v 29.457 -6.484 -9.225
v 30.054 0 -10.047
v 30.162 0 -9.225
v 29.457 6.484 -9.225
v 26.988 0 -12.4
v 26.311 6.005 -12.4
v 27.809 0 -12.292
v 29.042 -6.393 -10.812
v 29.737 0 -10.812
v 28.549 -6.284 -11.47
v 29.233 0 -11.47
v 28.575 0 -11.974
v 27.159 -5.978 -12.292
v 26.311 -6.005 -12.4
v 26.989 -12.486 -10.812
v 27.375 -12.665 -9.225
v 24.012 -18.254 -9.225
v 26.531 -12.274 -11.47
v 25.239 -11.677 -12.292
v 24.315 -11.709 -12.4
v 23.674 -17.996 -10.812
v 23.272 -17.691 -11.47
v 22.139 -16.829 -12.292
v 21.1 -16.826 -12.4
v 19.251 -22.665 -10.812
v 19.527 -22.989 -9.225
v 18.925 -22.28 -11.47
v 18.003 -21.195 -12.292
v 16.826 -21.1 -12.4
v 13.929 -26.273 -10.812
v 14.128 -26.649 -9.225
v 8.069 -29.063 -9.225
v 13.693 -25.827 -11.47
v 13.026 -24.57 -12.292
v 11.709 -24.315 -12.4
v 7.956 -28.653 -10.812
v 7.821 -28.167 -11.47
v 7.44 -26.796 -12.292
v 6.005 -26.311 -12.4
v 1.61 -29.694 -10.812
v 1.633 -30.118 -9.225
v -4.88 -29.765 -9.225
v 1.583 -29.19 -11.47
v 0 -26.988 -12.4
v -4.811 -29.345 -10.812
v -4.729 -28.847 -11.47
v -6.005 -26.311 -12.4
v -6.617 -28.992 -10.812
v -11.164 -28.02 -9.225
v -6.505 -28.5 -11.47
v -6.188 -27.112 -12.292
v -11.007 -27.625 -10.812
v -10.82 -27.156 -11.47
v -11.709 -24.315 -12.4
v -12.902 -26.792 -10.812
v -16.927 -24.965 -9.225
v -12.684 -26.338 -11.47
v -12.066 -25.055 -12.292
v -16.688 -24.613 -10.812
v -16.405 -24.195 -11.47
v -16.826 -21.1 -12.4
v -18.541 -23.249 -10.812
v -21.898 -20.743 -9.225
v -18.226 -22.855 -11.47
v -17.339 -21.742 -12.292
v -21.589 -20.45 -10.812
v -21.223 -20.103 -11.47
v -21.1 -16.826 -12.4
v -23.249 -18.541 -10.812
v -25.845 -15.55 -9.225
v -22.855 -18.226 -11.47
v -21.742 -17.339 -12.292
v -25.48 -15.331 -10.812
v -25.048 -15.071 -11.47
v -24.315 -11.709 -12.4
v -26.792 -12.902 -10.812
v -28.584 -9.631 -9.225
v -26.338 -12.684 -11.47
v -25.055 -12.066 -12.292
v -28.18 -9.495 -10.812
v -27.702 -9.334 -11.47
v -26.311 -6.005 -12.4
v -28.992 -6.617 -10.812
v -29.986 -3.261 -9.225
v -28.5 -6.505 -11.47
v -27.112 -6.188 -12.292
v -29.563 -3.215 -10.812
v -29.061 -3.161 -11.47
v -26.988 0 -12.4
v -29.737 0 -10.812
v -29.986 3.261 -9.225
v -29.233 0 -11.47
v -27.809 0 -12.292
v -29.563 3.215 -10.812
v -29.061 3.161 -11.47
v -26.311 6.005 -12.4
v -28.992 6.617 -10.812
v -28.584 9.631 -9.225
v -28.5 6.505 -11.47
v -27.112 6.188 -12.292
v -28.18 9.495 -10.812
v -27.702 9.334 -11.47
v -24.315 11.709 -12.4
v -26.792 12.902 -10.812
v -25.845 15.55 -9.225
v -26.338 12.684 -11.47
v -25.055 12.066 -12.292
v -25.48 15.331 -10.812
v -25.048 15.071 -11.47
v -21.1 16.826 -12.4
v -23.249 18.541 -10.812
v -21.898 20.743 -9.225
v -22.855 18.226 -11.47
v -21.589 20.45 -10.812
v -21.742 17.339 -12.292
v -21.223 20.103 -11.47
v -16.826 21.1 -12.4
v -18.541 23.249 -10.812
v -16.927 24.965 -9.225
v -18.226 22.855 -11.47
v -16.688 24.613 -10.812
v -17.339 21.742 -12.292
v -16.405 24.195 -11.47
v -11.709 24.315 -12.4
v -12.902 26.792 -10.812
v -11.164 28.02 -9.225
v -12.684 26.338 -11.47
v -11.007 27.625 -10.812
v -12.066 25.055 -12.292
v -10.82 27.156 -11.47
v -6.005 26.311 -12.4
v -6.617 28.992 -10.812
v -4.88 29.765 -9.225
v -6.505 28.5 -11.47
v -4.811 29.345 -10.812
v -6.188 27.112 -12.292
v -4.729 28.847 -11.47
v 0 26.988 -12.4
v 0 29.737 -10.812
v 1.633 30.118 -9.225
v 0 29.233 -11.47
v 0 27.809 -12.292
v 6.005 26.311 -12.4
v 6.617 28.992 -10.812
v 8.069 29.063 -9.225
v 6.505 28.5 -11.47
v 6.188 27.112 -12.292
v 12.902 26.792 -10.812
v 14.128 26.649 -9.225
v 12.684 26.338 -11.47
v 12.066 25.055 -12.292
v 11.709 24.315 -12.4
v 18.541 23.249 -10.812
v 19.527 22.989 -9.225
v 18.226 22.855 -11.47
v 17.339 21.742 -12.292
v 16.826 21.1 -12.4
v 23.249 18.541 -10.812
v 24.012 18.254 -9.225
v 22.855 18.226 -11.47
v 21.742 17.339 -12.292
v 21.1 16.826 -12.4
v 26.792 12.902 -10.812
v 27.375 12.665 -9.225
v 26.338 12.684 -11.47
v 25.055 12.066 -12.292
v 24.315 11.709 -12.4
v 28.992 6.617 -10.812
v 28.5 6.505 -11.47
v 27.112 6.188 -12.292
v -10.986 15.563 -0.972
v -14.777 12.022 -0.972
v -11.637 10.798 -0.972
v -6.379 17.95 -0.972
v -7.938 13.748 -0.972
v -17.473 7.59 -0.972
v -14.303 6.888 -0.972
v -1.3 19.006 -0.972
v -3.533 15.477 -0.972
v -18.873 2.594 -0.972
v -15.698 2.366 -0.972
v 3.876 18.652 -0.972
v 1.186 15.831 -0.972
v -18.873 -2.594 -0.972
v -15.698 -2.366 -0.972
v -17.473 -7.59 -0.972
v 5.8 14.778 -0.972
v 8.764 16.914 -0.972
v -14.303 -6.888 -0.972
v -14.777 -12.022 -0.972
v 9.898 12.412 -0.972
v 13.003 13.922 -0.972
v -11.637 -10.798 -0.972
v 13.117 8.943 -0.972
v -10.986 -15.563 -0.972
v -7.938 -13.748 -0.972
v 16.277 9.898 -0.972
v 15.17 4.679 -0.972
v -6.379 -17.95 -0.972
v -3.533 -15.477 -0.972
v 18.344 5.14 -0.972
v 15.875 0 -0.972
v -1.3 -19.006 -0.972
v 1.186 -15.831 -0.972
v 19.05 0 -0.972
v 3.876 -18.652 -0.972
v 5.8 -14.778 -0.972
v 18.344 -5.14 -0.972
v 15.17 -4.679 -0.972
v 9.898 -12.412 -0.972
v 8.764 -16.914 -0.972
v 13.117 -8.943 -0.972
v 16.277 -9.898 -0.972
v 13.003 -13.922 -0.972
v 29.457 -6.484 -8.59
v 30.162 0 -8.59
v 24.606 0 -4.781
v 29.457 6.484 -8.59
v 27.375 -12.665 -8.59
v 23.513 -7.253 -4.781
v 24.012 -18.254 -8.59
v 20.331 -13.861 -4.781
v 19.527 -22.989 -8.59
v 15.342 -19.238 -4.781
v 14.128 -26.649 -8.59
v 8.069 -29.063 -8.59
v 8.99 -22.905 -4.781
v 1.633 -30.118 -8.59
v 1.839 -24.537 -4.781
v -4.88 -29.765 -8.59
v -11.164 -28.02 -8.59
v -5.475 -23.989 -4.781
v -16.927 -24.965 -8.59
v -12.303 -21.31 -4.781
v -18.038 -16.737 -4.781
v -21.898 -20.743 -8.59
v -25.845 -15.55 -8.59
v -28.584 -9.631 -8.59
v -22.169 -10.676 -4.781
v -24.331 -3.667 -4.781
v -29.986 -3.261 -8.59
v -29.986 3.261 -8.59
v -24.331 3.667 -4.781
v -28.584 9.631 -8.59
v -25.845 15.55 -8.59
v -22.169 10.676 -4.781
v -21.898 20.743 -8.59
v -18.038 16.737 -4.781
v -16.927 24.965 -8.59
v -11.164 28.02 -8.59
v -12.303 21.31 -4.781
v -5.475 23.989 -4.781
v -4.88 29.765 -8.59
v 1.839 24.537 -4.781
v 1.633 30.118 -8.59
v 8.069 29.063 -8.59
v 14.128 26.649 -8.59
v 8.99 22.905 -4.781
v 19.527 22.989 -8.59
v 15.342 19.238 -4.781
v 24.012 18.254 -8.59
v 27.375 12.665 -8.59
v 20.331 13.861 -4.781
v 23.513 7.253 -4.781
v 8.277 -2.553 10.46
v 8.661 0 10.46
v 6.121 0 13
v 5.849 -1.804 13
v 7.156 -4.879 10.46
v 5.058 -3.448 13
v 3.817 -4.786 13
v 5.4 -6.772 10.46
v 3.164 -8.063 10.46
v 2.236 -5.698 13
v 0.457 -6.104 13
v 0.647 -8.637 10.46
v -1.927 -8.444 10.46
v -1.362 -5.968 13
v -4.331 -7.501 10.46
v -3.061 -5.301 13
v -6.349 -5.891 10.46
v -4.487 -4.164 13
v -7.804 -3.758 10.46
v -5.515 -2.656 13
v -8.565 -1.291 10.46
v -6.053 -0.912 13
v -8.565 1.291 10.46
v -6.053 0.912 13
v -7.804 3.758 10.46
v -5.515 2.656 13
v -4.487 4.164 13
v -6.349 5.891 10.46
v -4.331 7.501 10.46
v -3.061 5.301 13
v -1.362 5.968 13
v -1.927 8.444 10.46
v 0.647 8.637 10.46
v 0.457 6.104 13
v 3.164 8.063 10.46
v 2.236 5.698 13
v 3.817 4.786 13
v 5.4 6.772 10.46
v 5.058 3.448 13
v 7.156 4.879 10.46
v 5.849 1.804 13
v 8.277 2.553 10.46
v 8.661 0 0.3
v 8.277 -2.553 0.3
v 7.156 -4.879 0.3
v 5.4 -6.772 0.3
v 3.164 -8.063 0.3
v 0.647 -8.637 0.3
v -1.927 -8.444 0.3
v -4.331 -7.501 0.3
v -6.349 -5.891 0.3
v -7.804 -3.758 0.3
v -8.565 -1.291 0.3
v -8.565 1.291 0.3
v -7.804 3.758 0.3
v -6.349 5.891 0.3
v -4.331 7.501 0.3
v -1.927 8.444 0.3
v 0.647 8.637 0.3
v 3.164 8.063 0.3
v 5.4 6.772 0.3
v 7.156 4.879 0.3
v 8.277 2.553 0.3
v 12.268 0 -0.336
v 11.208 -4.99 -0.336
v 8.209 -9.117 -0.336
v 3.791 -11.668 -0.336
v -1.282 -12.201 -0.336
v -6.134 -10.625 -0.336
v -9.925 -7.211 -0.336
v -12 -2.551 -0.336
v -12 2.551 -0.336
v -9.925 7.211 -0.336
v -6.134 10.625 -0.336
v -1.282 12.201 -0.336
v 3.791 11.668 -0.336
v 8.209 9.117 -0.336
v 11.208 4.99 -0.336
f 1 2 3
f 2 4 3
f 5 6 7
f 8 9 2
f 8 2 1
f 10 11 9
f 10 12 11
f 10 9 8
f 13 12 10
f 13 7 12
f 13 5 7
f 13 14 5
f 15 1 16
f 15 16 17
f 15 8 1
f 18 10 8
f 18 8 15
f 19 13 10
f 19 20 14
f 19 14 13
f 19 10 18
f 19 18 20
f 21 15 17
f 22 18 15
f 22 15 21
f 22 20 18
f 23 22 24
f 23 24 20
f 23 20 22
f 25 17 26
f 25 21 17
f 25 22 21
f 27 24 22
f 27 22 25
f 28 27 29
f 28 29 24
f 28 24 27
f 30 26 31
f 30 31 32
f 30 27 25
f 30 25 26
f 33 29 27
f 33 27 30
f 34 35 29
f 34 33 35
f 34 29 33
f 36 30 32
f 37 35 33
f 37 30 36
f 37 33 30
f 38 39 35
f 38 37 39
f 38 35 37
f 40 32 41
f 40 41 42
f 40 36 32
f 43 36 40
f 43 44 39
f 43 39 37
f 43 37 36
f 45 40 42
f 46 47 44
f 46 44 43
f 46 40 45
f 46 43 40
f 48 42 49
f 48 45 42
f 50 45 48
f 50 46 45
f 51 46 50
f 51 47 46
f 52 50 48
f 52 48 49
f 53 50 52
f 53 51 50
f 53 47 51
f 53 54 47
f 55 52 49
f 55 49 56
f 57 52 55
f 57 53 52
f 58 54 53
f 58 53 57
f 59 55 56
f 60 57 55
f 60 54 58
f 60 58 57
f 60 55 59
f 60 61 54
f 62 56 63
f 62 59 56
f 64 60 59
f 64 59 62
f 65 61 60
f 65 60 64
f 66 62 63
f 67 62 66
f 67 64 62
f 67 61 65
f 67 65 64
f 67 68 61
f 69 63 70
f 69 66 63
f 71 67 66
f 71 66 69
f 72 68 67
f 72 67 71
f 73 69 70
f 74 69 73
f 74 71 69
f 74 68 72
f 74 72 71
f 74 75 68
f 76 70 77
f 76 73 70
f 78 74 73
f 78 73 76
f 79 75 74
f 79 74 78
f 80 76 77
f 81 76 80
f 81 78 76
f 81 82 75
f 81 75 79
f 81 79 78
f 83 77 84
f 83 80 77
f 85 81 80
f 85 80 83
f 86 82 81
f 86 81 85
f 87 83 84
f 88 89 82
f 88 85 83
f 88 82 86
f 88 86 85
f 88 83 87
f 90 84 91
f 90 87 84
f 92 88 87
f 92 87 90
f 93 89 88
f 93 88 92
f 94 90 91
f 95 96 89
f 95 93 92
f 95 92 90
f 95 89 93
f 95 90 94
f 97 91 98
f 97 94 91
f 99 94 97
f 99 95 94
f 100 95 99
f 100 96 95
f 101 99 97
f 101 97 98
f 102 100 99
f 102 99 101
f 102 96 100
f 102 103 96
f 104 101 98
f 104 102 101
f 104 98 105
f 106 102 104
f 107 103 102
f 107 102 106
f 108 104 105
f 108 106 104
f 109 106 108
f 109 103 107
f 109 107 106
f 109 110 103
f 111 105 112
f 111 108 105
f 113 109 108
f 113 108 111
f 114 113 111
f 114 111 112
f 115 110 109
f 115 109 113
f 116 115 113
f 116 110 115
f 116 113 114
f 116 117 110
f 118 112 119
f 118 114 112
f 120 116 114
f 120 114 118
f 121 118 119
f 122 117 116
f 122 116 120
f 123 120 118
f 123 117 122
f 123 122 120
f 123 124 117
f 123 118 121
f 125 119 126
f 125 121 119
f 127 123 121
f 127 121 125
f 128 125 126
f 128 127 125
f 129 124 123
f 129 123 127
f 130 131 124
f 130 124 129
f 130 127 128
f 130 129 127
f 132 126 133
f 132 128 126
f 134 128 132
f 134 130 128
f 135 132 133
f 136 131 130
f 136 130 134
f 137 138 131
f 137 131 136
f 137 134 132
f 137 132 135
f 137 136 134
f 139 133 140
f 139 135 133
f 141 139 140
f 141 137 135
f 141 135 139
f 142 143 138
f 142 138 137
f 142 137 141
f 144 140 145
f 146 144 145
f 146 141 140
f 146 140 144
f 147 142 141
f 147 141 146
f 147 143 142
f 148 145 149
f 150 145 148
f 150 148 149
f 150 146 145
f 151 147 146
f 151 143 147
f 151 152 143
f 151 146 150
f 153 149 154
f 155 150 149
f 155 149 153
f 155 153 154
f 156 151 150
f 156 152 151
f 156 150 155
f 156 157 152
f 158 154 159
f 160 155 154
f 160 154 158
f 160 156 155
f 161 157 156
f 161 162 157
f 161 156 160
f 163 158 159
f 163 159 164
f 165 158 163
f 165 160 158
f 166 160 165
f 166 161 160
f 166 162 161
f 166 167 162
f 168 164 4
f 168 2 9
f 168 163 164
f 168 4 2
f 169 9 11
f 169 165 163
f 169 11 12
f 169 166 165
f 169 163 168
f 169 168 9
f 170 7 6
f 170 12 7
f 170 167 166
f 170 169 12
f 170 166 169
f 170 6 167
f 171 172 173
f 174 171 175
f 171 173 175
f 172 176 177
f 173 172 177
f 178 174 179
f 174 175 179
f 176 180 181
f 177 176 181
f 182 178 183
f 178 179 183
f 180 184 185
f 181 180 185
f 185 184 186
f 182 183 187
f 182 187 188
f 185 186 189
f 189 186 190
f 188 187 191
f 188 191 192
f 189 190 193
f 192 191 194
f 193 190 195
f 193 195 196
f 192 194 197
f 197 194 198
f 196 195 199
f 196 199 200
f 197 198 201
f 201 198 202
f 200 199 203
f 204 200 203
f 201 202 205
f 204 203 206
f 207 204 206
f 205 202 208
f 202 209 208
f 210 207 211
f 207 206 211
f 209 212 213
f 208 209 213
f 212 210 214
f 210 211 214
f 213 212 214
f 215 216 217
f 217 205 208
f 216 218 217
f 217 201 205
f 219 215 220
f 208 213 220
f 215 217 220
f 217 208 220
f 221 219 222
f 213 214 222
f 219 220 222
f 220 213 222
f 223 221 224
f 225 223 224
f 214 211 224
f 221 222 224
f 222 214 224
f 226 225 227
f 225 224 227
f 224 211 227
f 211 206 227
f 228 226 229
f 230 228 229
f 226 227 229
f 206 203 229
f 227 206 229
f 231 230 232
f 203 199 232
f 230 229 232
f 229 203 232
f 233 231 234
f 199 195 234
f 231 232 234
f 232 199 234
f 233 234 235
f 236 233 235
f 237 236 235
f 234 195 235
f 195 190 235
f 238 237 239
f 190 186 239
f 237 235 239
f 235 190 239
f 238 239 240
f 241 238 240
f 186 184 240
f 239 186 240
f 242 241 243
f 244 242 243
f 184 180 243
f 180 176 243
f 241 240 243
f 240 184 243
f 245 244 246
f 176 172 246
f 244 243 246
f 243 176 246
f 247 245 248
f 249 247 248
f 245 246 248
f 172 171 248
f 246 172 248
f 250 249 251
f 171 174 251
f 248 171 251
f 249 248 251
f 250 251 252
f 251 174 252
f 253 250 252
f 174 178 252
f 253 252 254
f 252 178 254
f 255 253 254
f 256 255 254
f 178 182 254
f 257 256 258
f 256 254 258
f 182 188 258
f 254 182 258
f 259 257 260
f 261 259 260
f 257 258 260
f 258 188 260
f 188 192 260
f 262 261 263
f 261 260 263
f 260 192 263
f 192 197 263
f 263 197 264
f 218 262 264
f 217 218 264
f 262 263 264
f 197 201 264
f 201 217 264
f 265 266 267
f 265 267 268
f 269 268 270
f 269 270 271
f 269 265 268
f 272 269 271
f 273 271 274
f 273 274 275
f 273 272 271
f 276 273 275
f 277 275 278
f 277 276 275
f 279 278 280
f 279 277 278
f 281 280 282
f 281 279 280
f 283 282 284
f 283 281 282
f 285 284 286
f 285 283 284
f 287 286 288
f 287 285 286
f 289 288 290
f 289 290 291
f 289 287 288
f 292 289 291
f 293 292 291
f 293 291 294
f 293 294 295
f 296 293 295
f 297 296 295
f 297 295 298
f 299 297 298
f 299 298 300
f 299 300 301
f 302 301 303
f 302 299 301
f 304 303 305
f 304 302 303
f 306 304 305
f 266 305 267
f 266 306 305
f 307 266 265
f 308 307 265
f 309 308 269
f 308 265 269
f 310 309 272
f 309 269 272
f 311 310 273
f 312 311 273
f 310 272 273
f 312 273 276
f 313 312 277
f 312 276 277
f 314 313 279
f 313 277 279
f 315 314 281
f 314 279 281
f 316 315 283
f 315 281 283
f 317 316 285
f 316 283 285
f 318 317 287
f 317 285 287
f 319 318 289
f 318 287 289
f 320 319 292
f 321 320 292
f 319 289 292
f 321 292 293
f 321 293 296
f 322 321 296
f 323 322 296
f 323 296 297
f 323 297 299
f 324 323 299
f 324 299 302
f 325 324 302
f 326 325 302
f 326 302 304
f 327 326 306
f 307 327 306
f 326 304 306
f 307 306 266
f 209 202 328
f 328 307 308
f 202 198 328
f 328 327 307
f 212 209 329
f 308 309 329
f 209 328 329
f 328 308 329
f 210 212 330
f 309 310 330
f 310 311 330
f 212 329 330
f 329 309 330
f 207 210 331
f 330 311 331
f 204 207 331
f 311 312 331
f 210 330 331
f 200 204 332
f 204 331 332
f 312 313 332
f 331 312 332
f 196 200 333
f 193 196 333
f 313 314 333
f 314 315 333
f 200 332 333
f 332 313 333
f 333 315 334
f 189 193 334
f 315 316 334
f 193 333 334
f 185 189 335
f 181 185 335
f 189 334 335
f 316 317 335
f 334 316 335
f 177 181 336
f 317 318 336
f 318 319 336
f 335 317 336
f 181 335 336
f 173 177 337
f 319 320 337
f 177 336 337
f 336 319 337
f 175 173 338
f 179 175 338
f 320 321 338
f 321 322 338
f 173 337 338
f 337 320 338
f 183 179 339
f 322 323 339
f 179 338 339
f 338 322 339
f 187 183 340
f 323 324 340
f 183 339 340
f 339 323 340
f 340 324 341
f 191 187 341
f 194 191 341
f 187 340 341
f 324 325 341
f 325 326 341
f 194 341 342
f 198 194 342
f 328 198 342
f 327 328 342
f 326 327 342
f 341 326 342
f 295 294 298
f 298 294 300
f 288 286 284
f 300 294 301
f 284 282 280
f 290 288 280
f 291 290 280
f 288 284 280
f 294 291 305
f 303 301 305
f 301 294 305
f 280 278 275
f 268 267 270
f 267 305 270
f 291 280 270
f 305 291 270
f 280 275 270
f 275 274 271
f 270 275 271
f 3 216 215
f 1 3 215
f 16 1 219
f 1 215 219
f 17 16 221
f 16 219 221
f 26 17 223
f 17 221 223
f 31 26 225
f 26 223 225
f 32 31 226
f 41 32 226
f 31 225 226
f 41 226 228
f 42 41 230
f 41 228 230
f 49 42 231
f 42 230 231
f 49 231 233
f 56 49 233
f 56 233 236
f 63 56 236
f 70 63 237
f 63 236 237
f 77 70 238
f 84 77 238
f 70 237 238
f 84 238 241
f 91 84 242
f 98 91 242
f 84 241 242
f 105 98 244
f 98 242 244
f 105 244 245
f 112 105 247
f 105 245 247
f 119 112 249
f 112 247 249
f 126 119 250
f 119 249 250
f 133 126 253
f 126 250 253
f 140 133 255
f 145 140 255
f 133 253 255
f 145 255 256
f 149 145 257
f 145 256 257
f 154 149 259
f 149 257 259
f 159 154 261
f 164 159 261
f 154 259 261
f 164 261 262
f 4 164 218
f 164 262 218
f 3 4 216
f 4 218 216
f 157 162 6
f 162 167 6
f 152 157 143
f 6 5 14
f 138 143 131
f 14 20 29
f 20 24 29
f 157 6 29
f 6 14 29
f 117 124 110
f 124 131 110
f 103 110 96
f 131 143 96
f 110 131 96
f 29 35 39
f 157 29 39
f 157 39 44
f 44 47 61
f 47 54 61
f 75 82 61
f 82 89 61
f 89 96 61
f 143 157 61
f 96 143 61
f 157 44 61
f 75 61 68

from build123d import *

# Parameters (mm, degrees)
F2_SIZE = 2.54
F3_R    = 3.175


with BuildPart() as f1:
    # F0 (on Front) → F1 (revolve)
    with BuildSketch(Plane.XZ):
        Polygon((8.6614, 13.000173), (0, 13.000173), (0, -12.399827), (30.1625, -12.399827), (30.1625, -8.589827), (19.05, -0.971779), (15.875, -0.971779), (8.6614, 0.300173), align=None)
    revolve(axis=Axis((0, 0, 1.824711), (0, 0, -1)))

    # F2
    f2_edges = [f1.edges().sort_by_distance(p)[0] for p in [
        (-8.6614, 0, 13.000173),
    ]]
    chamfer(f2_edges, length=F2_SIZE)

    # F3
    f3_edges = [f1.edges().sort_by_distance(p)[0] for p in [
        (-30.1625, 0, -12.399827),
    ]]
    fillet(f3_edges, radius=F3_R)


solid = f1.part
